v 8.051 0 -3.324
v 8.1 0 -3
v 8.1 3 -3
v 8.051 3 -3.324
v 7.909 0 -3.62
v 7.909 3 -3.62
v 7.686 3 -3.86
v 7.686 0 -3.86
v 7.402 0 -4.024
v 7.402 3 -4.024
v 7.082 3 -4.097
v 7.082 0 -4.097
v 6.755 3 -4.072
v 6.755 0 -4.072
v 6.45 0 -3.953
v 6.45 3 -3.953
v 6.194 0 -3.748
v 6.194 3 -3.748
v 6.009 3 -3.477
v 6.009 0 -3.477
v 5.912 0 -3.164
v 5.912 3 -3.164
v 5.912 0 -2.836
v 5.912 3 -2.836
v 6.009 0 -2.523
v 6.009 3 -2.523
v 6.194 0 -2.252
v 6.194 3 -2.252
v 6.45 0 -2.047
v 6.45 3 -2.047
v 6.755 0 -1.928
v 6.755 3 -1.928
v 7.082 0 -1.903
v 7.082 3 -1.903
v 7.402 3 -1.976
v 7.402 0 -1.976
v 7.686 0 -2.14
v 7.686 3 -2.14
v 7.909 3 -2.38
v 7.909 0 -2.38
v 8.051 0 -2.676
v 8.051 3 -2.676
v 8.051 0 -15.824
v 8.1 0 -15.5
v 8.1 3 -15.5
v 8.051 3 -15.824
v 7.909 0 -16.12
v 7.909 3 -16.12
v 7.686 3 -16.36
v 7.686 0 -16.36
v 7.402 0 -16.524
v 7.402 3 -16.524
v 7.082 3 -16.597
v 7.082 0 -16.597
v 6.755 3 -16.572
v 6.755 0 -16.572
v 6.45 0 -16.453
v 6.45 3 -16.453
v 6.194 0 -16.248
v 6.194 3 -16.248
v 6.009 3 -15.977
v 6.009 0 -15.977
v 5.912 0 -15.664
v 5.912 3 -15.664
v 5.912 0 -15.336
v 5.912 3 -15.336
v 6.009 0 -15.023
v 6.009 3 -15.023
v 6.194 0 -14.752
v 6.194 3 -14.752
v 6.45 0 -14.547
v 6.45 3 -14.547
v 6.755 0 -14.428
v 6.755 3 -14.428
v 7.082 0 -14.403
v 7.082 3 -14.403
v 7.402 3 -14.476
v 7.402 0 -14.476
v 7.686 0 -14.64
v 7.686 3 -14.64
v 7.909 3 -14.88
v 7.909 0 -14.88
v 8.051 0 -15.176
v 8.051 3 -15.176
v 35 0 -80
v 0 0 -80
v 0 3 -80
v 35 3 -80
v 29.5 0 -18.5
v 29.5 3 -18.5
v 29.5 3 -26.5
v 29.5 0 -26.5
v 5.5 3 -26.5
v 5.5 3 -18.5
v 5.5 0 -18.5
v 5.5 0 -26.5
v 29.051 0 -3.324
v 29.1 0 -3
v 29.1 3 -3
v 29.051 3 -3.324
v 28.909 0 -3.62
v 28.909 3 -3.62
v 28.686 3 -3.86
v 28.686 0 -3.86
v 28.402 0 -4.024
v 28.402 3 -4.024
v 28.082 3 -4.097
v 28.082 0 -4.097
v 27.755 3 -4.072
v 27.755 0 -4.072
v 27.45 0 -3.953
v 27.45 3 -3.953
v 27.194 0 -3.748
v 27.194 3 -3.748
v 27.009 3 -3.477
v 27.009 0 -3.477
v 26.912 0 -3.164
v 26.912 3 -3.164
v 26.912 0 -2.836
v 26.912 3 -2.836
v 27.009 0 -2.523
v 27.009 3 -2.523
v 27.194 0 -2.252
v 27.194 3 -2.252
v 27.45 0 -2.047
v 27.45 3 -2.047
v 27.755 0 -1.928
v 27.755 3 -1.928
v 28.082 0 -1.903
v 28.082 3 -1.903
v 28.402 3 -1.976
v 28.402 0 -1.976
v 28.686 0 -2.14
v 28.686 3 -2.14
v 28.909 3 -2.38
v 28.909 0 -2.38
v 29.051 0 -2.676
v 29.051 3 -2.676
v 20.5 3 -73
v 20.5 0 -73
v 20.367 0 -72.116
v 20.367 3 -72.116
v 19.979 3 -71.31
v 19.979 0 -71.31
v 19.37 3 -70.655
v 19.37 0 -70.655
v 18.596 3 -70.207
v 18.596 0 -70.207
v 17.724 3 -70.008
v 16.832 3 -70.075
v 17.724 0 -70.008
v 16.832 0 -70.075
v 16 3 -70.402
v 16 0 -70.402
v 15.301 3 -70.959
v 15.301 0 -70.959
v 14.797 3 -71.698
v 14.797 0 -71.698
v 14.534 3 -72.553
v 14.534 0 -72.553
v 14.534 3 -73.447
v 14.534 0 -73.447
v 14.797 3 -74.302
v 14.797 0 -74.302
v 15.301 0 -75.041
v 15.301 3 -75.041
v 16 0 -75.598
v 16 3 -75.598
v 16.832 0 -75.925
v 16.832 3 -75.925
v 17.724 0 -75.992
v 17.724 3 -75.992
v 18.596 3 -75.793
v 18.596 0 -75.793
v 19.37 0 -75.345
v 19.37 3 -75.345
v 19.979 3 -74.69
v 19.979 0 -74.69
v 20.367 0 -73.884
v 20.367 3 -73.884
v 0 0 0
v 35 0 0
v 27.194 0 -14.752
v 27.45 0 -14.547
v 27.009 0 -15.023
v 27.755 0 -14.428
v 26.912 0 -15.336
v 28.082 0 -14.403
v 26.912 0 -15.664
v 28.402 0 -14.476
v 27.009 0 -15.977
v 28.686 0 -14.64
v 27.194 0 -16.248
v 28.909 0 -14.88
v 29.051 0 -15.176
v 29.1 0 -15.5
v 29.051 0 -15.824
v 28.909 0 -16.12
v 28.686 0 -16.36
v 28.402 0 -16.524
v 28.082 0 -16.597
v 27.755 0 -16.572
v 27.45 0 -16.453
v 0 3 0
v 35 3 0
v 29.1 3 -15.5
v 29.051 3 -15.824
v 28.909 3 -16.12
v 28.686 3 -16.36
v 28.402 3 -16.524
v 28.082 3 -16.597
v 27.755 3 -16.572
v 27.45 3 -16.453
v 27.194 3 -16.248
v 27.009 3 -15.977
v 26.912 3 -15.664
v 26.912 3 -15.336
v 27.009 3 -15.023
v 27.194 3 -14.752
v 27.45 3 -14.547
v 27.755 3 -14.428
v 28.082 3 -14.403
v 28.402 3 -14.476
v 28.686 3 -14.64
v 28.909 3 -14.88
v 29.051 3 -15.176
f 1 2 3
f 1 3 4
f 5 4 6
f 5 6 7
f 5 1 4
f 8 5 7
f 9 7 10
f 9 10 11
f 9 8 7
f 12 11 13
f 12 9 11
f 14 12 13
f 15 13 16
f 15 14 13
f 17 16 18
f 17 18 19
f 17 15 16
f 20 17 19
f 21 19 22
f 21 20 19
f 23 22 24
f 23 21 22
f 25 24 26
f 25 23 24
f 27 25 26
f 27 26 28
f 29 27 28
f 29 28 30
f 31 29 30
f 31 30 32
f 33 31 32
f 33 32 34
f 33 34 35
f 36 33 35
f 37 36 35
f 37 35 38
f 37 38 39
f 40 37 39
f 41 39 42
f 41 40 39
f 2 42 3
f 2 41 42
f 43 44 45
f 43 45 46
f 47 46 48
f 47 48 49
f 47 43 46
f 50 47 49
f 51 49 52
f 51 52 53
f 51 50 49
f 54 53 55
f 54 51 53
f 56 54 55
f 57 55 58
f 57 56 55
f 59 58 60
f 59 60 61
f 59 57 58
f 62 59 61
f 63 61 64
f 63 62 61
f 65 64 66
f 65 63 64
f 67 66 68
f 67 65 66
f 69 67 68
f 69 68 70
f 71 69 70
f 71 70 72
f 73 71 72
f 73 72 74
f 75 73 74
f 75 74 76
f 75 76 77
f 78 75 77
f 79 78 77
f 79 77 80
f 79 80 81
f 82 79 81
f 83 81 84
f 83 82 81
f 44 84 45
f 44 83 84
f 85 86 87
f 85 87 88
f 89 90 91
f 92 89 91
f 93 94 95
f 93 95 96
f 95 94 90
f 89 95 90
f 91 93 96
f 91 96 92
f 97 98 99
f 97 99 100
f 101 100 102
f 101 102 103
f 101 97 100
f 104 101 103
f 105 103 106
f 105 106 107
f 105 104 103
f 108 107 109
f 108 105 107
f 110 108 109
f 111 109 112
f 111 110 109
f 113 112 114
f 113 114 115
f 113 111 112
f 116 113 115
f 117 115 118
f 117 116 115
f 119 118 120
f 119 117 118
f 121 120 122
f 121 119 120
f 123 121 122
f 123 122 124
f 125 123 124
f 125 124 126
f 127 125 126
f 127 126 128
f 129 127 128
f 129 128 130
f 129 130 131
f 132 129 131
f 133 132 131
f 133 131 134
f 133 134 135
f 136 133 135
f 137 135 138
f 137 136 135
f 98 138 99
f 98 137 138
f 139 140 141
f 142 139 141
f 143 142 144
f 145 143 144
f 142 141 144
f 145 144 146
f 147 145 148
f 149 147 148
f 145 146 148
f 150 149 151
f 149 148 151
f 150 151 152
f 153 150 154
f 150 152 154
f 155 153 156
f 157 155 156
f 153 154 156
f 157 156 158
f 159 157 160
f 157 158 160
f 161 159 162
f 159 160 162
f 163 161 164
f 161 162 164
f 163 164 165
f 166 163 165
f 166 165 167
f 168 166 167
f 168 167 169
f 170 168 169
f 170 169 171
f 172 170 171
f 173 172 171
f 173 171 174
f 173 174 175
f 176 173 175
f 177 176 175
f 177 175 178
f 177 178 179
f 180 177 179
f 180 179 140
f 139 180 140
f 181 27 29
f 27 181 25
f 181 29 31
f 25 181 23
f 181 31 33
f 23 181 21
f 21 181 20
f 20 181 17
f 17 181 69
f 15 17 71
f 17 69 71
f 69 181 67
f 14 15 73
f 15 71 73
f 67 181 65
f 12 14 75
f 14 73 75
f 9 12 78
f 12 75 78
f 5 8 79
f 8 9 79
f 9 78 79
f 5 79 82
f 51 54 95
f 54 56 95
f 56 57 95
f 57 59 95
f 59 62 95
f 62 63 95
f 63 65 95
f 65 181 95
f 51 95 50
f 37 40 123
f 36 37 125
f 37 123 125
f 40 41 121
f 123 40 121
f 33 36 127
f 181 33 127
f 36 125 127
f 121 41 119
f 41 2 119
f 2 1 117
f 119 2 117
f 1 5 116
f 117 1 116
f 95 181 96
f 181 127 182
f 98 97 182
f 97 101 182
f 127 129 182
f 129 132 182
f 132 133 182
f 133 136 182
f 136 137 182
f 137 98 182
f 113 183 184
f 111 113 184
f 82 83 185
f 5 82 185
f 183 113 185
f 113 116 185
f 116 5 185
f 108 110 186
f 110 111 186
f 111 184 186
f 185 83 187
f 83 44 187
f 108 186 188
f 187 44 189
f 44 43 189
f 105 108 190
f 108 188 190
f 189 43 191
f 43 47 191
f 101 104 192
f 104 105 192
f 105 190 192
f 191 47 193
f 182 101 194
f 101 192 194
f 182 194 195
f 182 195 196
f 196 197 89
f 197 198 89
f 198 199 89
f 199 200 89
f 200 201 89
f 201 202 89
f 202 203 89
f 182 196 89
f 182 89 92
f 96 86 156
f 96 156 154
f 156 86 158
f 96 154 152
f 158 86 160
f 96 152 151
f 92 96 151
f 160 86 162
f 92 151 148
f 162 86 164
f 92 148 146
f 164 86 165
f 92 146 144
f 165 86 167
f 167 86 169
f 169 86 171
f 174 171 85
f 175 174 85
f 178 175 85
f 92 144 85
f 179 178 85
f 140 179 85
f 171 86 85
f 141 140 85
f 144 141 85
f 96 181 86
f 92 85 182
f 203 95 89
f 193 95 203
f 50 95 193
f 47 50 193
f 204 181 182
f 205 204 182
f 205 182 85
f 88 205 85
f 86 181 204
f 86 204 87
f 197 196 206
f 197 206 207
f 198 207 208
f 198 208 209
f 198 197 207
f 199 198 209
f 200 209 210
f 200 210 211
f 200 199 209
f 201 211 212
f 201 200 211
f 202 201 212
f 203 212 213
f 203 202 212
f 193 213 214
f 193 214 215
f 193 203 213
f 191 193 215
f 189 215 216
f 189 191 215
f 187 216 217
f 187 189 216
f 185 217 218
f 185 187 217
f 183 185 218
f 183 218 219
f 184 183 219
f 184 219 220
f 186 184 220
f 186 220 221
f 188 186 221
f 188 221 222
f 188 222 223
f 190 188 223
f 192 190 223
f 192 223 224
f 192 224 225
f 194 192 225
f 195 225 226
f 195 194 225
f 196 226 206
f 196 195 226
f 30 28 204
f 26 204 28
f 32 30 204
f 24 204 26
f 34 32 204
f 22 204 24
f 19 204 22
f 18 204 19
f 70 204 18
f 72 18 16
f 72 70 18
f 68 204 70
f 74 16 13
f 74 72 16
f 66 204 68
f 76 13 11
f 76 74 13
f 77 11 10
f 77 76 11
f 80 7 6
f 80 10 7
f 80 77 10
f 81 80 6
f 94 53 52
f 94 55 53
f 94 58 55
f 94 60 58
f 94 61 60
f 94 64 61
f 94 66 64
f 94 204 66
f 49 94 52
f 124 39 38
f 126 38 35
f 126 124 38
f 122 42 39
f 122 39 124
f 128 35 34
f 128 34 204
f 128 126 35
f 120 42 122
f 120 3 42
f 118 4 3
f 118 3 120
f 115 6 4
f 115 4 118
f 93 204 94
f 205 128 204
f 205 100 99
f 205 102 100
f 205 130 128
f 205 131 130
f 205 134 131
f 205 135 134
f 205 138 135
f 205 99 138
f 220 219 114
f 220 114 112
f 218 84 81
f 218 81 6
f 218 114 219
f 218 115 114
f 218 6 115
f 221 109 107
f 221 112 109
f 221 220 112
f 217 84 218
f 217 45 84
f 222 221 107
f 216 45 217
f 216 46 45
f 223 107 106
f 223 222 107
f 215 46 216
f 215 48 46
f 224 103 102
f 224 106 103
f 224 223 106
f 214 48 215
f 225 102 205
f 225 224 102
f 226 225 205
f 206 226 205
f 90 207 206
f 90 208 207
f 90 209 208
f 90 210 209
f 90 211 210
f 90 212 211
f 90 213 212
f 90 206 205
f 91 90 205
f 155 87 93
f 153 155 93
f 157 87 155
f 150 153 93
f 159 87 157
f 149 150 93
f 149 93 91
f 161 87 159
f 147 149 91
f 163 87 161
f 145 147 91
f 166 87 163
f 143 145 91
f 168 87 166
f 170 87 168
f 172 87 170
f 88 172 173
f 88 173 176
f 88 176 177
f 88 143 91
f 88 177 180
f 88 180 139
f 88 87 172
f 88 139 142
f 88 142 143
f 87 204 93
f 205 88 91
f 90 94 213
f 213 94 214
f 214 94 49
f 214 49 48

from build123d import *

# Parameters (mm, degrees)
SKETCH1_W           = 35
SKETCH1_H           = 80
SKETCH1_R           = 1.1
BOSS_EXTRUDE1_DEPTH = 3
SKETCH2_R           = 3
CUT_EXTRUDE1_DEPTH  = 4
SKETCH3_W           = 24
SKETCH3_H           = 8
CUT_EXTRUDE2_DEPTH  = 4


with BuildPart() as part:
    # Sketch1 → Boss-Extrude1 (new body)
    with BuildSketch(Plane(origin=(0, 0, 0), x_dir=(1, 0, 0), z_dir=(0, 1, 0))):
        with Locations((17.5, 40)):
            Rectangle(SKETCH1_W, SKETCH1_H)
        with Locations((7, 3)):
            Circle(SKETCH1_R, mode=Mode.SUBTRACT)
        with Locations((28, 3)):
            Circle(SKETCH1_R, mode=Mode.SUBTRACT)
        with Locations((7, 15.5)):
            Circle(SKETCH1_R, mode=Mode.SUBTRACT)
        with Locations((28, 15.5)):
            Circle(SKETCH1_R, mode=Mode.SUBTRACT)
    extrude(amount=BOSS_EXTRUDE1_DEPTH)

    # Sketch2 → Cut-Extrude1 (cut, through all)
    with BuildSketch(Plane.XZ):
        with Locations((17.5, -73)):
            Circle(SKETCH2_R)
    extrude(amount=-CUT_EXTRUDE1_DEPTH, mode=Mode.SUBTRACT)

    # Sketch3 → Cut-Extrude2 (cut, through all)
    with BuildSketch(Plane(origin=(0, 3, 0), x_dir=(1, 0, 0), z_dir=(0, 1, 0))):
        with Locations((17.5, 22.5)):
            Rectangle(SKETCH3_W, SKETCH3_H)
    extrude(amount=-CUT_EXTRUDE2_DEPTH, mode=Mode.SUBTRACT)


solid = part.part
